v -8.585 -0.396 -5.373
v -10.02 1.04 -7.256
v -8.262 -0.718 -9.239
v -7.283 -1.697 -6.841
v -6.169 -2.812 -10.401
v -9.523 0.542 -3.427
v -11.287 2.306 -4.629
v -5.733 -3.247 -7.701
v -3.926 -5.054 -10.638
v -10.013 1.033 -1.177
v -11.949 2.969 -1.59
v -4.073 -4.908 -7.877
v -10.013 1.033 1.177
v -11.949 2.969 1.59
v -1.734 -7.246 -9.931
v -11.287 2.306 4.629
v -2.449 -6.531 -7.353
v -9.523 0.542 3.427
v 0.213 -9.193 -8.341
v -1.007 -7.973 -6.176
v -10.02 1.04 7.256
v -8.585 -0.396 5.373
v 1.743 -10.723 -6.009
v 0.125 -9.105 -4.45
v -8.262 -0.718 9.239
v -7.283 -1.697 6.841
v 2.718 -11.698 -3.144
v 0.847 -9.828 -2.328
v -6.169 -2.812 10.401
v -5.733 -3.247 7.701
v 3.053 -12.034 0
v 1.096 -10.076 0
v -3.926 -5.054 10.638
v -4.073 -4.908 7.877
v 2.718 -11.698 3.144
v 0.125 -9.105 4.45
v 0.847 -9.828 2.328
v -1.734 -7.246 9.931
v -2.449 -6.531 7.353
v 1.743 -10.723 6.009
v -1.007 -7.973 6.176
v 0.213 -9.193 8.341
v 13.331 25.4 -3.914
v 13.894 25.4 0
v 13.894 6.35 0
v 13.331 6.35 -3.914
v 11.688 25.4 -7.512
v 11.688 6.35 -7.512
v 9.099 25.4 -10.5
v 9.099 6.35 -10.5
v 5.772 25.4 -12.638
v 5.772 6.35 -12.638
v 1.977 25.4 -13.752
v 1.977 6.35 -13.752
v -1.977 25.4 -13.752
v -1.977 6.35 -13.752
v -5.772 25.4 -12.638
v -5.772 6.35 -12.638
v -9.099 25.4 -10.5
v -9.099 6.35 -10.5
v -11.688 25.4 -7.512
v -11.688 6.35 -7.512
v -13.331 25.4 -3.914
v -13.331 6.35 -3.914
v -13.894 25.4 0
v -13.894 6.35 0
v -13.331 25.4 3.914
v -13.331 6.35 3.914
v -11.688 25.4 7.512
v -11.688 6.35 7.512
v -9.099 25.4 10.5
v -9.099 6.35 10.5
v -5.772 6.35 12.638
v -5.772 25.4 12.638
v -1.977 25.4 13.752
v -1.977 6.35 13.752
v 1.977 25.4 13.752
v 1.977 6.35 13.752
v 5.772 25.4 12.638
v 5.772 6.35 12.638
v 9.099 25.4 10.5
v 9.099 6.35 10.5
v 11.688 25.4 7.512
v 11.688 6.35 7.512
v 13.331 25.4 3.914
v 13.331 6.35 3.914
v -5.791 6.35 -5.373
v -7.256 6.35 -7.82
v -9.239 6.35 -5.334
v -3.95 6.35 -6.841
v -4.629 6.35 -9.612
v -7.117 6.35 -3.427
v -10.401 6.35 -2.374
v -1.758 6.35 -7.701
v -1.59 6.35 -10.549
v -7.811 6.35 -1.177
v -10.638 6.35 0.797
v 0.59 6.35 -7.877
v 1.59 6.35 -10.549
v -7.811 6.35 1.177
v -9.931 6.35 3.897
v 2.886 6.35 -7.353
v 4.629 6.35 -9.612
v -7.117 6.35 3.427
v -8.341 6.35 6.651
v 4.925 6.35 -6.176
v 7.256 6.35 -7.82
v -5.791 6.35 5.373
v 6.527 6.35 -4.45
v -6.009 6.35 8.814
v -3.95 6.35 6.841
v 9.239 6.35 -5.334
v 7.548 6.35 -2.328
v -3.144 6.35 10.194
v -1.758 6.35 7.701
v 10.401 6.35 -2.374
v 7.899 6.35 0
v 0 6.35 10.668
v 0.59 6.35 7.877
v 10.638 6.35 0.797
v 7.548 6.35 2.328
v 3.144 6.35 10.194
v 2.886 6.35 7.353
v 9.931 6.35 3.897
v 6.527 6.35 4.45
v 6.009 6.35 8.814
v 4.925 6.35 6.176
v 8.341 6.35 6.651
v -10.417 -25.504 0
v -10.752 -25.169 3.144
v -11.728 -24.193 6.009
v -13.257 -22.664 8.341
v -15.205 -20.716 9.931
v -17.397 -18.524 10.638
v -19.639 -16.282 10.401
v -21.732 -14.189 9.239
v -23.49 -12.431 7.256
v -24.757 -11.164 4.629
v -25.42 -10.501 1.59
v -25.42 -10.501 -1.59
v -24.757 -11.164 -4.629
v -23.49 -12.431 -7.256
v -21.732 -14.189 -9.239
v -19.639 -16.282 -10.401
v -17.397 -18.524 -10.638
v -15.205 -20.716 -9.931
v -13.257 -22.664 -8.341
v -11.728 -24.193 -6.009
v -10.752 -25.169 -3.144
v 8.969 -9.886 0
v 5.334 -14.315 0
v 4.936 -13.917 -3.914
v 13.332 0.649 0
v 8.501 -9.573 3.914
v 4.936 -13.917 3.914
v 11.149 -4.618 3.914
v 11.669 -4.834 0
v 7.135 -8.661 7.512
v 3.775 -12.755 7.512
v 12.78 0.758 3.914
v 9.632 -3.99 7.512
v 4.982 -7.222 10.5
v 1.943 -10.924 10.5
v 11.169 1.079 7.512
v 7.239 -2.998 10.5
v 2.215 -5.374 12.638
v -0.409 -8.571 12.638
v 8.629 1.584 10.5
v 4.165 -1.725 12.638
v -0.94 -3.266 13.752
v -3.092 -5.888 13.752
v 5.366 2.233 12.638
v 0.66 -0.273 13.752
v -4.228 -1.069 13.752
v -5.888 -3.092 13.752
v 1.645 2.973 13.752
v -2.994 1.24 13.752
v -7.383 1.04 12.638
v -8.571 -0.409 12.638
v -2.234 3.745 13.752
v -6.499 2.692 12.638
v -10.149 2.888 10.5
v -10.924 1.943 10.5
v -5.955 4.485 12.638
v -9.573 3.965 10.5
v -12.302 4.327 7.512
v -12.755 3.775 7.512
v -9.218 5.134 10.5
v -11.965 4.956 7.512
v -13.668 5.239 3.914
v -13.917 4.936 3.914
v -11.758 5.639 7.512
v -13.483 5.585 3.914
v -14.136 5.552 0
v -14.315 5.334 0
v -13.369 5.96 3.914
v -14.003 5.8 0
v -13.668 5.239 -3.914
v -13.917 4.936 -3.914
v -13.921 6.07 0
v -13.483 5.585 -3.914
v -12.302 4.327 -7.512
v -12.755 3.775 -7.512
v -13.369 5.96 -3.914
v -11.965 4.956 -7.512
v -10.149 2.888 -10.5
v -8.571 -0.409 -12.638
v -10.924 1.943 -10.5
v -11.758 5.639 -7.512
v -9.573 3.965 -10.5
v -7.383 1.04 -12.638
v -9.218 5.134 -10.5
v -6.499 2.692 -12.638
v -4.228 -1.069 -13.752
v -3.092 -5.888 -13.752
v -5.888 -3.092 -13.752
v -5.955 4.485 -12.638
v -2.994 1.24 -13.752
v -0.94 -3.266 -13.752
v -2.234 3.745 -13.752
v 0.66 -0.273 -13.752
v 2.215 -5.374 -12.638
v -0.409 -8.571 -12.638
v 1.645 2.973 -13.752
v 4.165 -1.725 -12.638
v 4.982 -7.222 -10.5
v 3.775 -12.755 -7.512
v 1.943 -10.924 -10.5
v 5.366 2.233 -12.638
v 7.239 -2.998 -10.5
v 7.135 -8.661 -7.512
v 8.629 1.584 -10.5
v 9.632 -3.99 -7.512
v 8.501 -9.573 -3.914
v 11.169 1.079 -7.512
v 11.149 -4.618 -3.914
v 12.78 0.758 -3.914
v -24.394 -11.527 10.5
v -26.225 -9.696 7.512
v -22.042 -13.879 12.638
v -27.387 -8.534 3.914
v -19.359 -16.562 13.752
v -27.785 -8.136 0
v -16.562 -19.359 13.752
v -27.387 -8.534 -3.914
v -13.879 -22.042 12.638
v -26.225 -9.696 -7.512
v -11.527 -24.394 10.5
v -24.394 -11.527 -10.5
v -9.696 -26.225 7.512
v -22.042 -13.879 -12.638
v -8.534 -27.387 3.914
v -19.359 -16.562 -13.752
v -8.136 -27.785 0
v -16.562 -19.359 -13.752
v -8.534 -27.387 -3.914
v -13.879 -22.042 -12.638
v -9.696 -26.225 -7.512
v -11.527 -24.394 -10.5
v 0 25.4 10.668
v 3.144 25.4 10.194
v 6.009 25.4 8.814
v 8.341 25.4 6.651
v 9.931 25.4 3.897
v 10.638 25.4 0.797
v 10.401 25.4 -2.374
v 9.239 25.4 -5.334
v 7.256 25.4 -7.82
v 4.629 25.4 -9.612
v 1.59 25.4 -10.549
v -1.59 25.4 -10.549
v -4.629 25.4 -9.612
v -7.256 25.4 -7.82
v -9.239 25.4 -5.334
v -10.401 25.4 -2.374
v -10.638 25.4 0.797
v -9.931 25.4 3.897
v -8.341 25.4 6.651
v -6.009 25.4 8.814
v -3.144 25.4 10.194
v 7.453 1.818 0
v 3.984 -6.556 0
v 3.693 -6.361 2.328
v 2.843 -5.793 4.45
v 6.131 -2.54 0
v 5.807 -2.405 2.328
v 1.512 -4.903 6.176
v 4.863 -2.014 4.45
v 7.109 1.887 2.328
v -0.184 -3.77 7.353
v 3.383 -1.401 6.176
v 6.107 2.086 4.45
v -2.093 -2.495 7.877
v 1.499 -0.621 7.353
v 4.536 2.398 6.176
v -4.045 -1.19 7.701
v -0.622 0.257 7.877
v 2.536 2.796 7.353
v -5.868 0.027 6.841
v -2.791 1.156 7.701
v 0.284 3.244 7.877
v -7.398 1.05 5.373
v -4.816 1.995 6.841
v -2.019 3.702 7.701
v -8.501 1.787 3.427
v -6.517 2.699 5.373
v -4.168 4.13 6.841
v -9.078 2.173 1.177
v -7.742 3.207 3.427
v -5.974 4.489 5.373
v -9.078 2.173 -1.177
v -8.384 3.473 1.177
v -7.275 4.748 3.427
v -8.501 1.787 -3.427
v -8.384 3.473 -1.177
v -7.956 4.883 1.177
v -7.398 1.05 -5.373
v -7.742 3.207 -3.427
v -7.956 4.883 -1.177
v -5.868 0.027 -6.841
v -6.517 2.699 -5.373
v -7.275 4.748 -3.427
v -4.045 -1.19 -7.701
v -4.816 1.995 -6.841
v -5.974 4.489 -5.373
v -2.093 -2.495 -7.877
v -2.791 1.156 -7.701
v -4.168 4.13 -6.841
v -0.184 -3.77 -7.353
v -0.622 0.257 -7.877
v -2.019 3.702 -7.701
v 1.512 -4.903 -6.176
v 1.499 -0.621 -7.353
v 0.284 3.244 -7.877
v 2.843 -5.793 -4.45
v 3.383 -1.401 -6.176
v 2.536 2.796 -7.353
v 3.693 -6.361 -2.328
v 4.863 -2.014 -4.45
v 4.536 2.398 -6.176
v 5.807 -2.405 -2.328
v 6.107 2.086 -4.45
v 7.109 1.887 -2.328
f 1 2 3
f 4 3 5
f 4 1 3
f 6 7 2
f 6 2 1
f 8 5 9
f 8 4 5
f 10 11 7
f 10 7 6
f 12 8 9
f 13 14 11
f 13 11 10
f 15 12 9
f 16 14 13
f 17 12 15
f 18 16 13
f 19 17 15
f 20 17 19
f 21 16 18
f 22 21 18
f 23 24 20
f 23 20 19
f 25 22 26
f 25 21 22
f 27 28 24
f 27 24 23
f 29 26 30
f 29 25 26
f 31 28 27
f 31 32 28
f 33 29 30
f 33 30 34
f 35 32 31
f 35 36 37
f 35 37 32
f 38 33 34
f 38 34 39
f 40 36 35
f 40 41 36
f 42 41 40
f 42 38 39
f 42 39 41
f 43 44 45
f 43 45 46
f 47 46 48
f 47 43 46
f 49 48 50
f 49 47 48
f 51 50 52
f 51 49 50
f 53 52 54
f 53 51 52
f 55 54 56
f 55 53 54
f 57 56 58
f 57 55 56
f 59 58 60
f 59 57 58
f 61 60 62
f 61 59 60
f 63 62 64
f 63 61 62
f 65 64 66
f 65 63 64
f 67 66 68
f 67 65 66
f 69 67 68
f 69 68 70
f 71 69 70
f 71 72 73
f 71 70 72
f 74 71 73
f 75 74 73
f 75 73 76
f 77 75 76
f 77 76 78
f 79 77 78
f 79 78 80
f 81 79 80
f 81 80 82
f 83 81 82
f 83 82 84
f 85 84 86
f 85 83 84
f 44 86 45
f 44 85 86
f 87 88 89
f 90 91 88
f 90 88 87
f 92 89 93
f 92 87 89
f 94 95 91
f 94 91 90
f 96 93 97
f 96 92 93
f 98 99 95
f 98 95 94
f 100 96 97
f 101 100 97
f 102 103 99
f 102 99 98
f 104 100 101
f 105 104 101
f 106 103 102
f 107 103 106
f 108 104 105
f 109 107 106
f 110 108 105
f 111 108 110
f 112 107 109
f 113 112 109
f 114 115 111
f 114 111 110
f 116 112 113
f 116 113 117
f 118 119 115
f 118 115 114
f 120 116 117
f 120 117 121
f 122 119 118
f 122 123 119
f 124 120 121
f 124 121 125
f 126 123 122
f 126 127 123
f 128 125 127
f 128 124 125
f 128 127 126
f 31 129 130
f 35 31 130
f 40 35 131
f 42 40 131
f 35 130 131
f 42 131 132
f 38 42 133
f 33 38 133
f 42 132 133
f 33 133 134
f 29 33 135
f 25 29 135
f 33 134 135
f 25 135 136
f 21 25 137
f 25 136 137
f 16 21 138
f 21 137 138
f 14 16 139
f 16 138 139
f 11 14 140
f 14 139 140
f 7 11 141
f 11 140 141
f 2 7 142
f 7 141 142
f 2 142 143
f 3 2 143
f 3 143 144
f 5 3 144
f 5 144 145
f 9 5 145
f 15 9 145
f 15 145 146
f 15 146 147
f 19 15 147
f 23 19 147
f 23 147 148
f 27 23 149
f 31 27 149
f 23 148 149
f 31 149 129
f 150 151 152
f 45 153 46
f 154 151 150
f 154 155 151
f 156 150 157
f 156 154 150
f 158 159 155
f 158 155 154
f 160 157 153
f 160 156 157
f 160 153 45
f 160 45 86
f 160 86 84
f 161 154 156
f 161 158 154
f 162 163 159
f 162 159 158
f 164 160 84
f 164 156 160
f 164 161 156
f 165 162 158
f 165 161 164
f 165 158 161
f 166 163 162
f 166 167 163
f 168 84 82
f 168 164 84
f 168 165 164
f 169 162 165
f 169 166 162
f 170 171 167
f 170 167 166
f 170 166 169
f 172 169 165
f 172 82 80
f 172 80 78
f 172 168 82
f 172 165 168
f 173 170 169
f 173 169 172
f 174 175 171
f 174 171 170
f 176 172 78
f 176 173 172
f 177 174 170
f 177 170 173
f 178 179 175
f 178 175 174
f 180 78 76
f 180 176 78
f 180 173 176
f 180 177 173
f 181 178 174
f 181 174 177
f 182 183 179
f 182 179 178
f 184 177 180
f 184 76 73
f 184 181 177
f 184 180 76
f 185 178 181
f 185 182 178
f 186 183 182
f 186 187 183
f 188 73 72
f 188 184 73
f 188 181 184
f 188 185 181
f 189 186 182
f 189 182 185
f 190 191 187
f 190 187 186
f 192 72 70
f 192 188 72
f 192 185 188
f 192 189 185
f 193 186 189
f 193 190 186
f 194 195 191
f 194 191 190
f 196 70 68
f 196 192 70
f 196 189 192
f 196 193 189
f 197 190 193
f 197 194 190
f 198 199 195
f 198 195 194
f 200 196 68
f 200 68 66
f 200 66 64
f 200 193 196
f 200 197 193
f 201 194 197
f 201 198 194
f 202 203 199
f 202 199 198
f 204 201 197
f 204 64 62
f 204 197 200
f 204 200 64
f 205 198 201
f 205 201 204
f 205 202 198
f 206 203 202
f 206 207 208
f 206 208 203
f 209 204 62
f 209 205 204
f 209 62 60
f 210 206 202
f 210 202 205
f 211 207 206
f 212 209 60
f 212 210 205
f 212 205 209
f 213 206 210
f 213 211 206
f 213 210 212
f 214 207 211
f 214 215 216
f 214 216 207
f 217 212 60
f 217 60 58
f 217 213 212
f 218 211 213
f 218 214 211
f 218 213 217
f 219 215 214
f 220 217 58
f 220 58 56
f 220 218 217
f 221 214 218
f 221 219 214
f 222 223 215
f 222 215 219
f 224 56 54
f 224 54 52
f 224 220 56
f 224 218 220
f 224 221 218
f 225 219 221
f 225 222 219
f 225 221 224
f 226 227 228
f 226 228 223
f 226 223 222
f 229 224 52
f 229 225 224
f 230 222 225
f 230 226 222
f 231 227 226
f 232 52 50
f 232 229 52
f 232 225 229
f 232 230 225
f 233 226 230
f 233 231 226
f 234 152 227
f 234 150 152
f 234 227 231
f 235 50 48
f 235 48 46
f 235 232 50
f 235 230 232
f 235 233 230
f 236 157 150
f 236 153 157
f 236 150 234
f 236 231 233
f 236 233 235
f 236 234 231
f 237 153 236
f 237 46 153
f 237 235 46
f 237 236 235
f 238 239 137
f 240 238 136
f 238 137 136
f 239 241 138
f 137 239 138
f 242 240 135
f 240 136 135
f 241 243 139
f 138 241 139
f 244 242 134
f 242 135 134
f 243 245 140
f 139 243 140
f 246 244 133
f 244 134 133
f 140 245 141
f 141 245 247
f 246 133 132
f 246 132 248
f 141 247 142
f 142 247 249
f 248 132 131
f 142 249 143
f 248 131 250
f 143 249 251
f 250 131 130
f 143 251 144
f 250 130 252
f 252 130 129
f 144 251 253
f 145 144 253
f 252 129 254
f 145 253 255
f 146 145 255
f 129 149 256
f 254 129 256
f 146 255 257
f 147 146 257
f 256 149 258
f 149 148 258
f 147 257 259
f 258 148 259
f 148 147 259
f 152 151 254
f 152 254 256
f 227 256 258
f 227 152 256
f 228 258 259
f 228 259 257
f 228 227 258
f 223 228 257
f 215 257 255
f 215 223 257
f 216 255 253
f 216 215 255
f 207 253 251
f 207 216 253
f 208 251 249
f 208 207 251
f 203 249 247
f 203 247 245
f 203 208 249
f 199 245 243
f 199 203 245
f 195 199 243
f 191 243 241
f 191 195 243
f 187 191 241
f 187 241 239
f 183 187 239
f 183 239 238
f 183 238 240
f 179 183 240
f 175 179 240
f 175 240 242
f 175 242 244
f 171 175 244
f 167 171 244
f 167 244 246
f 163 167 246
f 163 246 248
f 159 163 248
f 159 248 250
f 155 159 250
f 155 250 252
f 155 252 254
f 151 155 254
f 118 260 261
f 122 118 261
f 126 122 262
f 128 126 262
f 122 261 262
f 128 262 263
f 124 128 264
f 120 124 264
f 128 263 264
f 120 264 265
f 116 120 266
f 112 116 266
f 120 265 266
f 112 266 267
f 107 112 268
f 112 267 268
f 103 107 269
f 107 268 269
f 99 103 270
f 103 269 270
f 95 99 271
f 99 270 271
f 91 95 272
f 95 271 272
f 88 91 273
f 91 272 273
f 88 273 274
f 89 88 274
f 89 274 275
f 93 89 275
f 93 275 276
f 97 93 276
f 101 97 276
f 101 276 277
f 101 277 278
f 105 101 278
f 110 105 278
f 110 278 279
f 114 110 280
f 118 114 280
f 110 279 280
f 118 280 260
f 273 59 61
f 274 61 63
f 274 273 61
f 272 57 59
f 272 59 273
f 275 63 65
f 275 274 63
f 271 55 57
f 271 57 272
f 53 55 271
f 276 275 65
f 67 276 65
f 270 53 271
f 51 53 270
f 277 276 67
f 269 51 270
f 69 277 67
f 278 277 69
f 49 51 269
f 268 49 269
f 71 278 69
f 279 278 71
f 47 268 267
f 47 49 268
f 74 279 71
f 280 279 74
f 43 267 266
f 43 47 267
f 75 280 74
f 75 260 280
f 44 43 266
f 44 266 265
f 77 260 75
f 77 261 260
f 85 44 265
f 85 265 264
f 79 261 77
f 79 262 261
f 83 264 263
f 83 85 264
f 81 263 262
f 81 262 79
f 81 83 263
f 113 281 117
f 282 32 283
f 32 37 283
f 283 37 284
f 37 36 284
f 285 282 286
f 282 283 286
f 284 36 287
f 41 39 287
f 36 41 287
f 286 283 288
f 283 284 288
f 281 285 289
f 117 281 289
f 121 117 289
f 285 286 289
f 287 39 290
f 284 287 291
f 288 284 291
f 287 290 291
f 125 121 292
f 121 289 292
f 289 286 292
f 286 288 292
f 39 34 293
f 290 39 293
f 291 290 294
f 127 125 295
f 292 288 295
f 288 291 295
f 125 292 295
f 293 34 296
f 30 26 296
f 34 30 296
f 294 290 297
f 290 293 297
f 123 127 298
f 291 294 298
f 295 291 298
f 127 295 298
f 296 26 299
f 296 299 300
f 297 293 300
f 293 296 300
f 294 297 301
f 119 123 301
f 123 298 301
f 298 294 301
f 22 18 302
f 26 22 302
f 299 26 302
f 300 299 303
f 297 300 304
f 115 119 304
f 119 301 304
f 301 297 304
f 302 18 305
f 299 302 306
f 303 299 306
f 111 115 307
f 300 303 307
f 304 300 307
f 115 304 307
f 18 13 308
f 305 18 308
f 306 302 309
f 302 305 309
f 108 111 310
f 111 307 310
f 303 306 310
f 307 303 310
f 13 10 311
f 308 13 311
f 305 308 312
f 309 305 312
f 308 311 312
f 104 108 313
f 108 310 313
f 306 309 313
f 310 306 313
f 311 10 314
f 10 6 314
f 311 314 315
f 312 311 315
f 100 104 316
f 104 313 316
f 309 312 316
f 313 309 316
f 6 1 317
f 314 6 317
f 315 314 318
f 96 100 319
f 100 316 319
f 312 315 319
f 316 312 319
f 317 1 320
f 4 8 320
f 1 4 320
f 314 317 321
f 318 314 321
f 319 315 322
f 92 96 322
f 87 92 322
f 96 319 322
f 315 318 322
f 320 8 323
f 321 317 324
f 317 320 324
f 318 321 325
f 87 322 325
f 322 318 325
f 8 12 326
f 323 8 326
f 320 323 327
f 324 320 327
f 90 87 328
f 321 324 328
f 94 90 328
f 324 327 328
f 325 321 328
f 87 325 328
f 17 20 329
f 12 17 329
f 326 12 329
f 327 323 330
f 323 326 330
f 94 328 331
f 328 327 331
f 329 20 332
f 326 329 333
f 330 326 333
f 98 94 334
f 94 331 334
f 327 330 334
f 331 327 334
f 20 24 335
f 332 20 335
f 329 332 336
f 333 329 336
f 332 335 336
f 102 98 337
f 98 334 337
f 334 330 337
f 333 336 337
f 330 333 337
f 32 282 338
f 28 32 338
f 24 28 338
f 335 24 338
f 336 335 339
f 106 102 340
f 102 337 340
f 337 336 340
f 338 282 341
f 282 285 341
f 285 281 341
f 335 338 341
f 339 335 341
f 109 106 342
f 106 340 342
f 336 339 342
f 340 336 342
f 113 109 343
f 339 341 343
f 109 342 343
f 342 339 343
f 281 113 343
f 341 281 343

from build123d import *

# Parameters (mm, degrees)
SKETCH2_R          = 13.8938
SKETCH2_R_2        = 7.8994
SKETCH5_R          = 10.668
CUT_EXTRUDE1_DEPTH = 19.05
SKETCH6_R          = 10.668
CUT_EXTRUDE2_DEPTH = 19.05


with BuildPart() as part:
    # Sweep1: sweep along a path in Sketch3
    with BuildLine(Plane.XY) as sweep1_path:
        Line((-17.960512242, -17.960512242), (-4.490128061, -4.490128061))
        ThreePointArc((-4.490128061, -4.490128061), (-1.166946263, 0.483364969), (0, 6.35))
        Line((0, 6.35), (0, 25.4))
    # Sketch2 → Sweep1 (sweep)
    with BuildSketch(Plane(origin=(0, 25.4, 0), x_dir=(1, 0, 0), z_dir=(0, 1, 0))):
        Circle(SKETCH2_R)
        Circle(SKETCH2_R_2, mode=Mode.SUBTRACT)
    sweep(path=sweep1_path.line)

    # Sketch5 → Cut-Extrude1 (cut)
    with BuildSketch(Plane(origin=(0, 25.4, 0), x_dir=(1, 0, 0), z_dir=(0, 1, 0))):
        with Locations(Location((0, 0, 0), (0, 0, 270))):
            Circle(SKETCH5_R)
    extrude(amount=-CUT_EXTRUDE1_DEPTH, mode=Mode.SUBTRACT)

    # Sketch6 → Cut-Extrude2 (cut)
    with BuildSketch(Plane(origin=(-17.960512242, -17.960512242, 0), x_dir=(0, 0, 1), z_dir=(-0.7071067811865408, -0.7071067811865543, 0))):
        with Locations(Location((0, 0, 0), (0, 0, 270))):
            Circle(SKETCH6_R)
    extrude(amount=-CUT_EXTRUDE2_DEPTH, mode=Mode.SUBTRACT)


solid = part.part
